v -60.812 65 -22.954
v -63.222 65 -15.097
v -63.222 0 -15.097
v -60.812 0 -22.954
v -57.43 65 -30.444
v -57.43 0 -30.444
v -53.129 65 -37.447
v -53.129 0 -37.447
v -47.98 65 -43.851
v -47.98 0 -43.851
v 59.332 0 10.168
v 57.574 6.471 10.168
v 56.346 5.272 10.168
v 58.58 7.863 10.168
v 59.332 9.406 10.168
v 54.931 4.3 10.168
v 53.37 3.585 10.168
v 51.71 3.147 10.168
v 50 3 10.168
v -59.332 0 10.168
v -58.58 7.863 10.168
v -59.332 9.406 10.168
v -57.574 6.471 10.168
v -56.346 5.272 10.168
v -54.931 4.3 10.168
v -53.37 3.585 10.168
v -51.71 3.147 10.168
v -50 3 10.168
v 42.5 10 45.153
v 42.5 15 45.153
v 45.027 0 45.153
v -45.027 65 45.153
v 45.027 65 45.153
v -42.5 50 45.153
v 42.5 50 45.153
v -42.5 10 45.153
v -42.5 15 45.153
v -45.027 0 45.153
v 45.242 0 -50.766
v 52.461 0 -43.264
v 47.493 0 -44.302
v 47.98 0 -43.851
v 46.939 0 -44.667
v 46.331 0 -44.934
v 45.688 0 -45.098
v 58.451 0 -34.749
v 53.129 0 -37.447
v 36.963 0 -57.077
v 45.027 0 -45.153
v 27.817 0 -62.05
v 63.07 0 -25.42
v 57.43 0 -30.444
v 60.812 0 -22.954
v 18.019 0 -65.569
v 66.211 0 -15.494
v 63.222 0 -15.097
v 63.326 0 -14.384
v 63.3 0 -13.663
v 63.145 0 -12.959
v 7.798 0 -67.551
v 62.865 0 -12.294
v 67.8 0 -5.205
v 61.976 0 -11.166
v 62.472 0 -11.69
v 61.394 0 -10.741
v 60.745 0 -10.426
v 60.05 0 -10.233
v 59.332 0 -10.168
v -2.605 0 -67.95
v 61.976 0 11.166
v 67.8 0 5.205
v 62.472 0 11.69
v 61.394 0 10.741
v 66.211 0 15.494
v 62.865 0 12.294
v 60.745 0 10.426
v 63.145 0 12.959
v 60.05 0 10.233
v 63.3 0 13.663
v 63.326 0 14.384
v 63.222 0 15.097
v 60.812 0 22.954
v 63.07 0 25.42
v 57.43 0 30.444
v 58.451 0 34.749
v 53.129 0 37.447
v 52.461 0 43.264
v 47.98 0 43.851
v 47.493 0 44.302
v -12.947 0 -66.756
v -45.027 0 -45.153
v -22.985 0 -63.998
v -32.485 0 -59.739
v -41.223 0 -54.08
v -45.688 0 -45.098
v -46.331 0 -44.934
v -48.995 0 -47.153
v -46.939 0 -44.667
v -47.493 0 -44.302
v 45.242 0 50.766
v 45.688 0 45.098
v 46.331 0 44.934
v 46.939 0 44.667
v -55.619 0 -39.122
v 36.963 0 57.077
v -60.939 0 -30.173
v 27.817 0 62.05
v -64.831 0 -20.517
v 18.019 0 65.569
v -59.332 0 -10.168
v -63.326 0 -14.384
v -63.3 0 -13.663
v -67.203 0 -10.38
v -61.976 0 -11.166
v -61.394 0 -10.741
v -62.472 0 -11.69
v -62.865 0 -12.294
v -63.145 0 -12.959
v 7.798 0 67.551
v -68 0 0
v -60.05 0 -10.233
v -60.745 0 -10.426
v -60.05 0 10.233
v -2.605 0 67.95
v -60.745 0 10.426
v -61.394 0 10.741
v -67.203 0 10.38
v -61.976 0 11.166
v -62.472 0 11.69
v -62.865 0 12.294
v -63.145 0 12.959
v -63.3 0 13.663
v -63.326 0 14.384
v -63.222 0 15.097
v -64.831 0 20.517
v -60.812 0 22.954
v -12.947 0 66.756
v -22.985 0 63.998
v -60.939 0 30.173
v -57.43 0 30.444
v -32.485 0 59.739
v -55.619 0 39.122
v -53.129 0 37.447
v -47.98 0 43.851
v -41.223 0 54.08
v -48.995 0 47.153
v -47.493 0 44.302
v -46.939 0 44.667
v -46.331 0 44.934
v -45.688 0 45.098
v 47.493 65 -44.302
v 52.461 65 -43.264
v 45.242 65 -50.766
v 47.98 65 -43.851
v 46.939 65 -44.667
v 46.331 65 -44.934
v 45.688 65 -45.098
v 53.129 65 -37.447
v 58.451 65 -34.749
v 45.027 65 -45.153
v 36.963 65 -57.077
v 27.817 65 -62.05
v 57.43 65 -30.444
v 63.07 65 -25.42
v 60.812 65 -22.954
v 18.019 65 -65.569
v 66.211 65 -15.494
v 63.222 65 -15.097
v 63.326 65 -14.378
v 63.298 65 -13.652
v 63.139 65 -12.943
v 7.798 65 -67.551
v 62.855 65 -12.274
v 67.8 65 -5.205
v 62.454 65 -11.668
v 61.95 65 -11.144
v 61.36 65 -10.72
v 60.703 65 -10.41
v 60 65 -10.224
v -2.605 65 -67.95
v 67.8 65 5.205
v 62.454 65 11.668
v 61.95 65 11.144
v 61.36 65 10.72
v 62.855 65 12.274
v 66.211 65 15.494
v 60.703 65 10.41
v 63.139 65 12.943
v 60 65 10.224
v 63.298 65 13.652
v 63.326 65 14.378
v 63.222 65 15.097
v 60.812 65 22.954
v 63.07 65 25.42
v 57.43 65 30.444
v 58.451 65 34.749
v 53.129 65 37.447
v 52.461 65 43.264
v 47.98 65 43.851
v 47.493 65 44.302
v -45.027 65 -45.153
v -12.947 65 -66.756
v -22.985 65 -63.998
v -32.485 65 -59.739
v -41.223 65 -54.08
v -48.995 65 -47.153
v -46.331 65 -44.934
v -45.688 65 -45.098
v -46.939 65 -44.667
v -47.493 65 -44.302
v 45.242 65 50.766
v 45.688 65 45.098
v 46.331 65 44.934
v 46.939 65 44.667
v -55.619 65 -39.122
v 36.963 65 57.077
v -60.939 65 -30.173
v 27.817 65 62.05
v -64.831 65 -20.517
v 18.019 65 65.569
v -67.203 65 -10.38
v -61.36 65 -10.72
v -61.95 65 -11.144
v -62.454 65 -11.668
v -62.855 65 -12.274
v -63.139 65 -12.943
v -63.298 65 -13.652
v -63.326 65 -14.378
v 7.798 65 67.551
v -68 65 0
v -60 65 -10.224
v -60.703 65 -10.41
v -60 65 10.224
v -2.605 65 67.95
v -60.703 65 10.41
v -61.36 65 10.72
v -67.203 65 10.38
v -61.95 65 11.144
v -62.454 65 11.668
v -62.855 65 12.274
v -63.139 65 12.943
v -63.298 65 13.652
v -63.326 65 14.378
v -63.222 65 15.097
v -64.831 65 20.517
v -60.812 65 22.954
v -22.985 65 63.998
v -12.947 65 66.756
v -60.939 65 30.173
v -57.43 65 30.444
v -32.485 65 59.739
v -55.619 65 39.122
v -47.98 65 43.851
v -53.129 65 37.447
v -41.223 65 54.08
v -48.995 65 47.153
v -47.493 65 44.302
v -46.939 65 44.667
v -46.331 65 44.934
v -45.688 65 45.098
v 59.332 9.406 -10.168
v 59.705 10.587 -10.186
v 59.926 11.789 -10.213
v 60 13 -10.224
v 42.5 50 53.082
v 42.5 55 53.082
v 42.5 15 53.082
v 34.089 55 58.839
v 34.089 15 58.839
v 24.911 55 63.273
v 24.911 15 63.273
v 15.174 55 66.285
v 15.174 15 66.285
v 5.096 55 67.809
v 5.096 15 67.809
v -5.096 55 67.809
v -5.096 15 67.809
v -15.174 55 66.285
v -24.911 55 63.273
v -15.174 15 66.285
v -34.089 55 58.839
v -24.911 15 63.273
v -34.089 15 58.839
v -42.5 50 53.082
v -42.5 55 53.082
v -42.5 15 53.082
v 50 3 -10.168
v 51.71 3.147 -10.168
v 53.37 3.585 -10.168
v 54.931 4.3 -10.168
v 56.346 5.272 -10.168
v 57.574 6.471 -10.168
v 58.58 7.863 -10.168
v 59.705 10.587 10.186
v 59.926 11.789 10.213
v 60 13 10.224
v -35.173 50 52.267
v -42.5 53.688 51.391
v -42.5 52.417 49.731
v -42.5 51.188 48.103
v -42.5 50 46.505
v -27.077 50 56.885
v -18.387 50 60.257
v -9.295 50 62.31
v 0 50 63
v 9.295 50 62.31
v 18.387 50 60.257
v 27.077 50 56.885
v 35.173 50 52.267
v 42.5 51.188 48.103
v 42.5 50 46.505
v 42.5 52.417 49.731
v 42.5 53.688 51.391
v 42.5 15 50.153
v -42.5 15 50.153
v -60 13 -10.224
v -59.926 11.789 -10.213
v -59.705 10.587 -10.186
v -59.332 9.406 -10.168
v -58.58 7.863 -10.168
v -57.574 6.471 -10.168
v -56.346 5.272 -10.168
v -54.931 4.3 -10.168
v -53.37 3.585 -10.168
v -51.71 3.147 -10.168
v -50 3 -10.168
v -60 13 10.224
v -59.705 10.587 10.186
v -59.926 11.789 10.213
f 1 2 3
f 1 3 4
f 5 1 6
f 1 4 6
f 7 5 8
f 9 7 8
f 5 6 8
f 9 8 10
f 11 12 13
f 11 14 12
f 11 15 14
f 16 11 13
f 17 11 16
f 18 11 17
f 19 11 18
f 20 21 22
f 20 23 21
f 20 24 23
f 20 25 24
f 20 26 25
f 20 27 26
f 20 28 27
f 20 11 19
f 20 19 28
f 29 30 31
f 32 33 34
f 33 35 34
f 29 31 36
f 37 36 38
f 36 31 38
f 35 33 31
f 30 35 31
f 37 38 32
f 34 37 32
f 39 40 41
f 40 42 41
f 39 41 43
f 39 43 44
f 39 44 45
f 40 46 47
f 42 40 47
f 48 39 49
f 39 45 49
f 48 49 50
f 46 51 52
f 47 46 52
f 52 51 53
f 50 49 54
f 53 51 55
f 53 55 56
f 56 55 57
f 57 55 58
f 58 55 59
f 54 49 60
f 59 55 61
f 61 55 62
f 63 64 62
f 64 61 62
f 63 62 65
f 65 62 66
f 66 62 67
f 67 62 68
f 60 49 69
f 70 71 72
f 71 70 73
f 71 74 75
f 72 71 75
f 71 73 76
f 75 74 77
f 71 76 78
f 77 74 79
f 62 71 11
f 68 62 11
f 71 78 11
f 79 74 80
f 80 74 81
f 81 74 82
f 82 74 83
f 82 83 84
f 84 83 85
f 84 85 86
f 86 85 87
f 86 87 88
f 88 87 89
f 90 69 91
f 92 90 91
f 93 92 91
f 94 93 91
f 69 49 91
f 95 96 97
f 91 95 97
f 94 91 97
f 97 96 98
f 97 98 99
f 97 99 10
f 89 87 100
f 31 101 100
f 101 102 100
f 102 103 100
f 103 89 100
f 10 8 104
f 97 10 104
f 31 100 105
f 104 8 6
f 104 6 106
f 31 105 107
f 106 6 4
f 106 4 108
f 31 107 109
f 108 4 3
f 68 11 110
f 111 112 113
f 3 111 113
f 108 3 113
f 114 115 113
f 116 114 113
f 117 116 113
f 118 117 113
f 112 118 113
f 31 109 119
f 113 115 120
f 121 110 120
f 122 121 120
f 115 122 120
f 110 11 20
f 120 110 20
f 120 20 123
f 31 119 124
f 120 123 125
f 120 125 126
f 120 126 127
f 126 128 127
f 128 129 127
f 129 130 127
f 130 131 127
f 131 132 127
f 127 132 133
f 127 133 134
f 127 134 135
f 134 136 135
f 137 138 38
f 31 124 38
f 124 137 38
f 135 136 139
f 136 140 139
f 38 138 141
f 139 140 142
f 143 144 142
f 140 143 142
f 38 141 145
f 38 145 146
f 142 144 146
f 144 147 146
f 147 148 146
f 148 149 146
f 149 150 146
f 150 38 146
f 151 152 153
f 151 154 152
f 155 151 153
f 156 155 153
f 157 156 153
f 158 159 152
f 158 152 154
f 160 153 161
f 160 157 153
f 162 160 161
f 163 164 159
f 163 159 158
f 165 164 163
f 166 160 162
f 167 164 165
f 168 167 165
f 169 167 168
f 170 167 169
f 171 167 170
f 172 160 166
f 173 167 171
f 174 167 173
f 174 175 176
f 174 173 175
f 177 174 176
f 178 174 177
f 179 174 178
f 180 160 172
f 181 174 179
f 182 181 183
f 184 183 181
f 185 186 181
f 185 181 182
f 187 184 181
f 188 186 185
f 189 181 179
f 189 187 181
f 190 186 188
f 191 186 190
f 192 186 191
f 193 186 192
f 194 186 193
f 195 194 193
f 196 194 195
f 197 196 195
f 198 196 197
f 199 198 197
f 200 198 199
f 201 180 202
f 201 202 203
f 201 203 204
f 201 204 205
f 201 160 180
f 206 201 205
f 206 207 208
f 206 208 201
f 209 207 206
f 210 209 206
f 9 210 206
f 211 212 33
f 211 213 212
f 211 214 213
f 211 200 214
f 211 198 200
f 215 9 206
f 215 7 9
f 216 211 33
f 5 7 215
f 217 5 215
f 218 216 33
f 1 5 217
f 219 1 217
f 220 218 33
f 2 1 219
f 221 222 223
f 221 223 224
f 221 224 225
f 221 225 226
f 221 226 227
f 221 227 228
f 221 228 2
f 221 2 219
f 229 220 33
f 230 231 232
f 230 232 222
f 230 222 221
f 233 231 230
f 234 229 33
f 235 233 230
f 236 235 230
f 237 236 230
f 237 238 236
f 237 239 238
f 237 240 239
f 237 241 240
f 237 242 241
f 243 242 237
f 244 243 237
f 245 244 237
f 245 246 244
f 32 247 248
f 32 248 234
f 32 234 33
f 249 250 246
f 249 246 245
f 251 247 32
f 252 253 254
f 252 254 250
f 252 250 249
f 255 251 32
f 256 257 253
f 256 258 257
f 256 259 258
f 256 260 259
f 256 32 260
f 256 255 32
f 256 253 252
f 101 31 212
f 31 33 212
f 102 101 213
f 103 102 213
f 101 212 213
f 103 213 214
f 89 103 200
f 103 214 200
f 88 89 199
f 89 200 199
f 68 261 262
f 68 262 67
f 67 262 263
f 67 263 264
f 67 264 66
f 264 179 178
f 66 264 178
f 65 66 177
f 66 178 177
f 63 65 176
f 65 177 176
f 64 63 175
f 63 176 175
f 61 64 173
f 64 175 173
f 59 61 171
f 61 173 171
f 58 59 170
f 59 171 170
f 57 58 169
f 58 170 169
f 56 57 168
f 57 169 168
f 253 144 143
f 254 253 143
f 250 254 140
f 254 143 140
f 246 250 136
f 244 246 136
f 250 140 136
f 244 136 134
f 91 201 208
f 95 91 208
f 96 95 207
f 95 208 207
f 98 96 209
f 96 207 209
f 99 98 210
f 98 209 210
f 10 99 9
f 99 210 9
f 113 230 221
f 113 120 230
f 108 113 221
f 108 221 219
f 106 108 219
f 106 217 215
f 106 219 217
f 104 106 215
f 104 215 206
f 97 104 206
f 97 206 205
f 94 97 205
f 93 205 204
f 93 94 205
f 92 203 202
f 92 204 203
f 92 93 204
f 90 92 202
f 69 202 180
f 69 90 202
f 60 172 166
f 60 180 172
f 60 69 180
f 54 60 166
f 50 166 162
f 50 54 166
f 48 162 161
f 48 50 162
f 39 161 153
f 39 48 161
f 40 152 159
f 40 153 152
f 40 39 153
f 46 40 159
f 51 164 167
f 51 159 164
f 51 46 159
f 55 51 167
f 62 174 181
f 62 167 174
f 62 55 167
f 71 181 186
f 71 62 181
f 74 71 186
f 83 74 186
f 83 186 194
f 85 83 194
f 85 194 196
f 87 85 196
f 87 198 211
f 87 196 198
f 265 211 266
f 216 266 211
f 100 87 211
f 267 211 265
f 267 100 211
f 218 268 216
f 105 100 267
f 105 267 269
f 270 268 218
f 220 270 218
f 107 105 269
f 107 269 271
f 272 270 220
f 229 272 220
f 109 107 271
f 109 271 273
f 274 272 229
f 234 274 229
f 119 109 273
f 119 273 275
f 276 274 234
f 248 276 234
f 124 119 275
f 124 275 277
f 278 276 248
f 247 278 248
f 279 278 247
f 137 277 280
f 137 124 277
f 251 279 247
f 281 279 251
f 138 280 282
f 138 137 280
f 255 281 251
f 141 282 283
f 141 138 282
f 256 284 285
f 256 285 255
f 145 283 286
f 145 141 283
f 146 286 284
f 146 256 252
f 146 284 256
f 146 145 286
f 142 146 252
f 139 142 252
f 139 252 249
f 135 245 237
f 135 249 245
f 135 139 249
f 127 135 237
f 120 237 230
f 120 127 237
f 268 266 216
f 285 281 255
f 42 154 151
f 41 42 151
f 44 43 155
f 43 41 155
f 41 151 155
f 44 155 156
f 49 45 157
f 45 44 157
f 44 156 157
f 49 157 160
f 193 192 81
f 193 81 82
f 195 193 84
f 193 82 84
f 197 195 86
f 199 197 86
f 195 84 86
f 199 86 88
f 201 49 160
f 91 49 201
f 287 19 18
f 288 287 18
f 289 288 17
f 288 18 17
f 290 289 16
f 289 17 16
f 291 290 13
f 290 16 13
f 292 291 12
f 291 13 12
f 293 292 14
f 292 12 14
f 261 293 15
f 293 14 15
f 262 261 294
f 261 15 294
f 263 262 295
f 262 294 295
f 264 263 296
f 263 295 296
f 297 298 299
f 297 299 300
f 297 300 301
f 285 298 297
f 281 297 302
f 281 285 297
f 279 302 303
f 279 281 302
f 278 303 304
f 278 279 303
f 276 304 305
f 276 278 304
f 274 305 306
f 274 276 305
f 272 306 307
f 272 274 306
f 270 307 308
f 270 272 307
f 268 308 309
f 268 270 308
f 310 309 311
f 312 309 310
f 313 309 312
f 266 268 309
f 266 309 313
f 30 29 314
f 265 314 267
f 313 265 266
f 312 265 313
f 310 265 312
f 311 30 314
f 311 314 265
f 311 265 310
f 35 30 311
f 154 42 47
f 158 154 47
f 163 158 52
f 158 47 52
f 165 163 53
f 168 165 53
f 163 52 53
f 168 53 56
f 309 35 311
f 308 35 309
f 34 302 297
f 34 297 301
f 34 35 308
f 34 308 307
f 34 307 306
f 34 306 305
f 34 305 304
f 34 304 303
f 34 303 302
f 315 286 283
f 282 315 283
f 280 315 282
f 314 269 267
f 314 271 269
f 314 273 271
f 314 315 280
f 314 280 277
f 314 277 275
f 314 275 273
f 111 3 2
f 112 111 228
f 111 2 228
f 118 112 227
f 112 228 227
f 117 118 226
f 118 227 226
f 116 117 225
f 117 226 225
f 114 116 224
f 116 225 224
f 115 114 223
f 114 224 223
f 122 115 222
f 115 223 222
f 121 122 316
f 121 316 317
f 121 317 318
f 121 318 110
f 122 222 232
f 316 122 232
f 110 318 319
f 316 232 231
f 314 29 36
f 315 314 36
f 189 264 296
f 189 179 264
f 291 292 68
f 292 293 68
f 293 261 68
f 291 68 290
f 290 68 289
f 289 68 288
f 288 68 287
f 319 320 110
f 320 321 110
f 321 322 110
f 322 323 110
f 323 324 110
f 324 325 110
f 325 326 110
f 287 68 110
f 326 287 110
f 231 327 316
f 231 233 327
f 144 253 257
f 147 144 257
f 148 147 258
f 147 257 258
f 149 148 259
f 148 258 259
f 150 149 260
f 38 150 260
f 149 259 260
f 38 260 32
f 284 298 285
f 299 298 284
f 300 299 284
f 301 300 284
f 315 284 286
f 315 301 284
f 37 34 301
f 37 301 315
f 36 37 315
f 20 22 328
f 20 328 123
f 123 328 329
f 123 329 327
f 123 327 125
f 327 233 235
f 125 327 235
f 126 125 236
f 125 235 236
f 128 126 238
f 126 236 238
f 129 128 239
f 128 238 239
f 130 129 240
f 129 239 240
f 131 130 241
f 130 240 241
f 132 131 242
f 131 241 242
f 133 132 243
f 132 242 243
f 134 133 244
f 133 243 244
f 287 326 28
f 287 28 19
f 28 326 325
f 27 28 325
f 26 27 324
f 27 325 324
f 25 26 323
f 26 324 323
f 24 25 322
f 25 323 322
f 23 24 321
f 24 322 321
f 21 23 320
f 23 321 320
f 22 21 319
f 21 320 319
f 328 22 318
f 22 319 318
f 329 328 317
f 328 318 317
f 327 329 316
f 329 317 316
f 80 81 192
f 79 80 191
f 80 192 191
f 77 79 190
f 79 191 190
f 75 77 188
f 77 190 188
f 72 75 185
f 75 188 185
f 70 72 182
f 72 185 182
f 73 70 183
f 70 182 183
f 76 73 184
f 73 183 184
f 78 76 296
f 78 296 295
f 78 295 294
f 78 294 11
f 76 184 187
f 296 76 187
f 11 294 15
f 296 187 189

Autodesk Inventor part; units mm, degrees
ref_plane "YZ Plane" through (0, 0, 0) normal (1, 0, 0) x (0, 1, 0)
ref_plane "XZ Plane" through (0, 0, 0) normal (0, 1, 0) x (-1, 0, 0)
ref_plane "XY Plane" through (0, 0, 0) normal (0, 0, 1) x (1, 0, 0)
sketch "Эскиз1" plane through (0, 0, 0) normal (0, 1, 0) x (-1, 0, 0)
  circle A0 centre (0, 0) radius 68
  dimension "d0" = 136
extrude "Выдавливание1" add sketch "Эскиз1" along normal blind 65
sketch "Эскиз2" plane through (0, 0, 0) normal (0, -1, 0) x (1, 0, 0)
  arc A0 (46.7571, -45.1528) -> (64.1997, -10.1682) centre (0, 0) ccw
  line L0 (0, 0) -> (64.1997, -10.1682) construction
  line L1 (0, 0) -> (65, 0) construction
  line L2 (0, 0) -> (46.7571, -45.1528) construction
  arc A1 (-64.1997, -10.1682) -> (-46.7571, -45.1528) centre (0, 0) ccw
  line L3 (0, 0) -> (-64.1997, -10.1682) construction
  line L4 (0, 0) -> (65, 0) construction
  line L5 (0, 0) -> (-46.7571, -45.1528) construction
  line L6 (46.7571, -45.1528) -> (-46.7571, -45.1528)
  line L7 (64.1997, -10.1682) -> (-64.1997, -10.1682)
  dimension "d3" = 65
  dimension "d4" = 9
  dimension "d5" = 35
  dimension "d6" = 65
  dimension "d7" = 171
  dimension "d8" = 35
extrude "Выдавливание2" cut sketch "Эскиз2" against normal blind 65
sketch "Эскиз3" plane through (0, 0, 0) normal (0, -1, 0) x (1, 0, 0)
  arc A0 (64.1997, 10.1682) -> (46.7571, 45.1528) centre (0, 0) ccw
  line L0 (0, 0) -> (64.1997, 10.1682) construction
  line L1 (0, 0) -> (65, 0) construction
  line L2 (0, 0) -> (46.7571, 45.1528) construction
  arc A1 (-46.7571, 45.1528) -> (-64.1997, 10.1682) centre (0, 0) ccw
  line L3 (0, 0) -> (-64.1997, 10.1682) construction
  line L4 (0, 0) -> (65, 0) construction
  line L5 (0, 0) -> (-46.7571, 45.1528) construction
  line L6 (46.7571, 45.1528) -> (-46.7571, 45.1528)
  line L7 (64.1997, 10.1682) -> (-64.1997, 10.1682)
  dimension "d11" = 65
  dimension "d12" = 9
  dimension "d13" = 35
  dimension "d14" = 65
  dimension "d15" = 171
  dimension "d16" = 35
extrude "Выдавливание3" cut sketch "Эскиз3" against normal blind 65
sketch "Эскиз4" plane through (0, 65, 0) normal (0, 1, 0) x (1, 0, 0)
  line L0 (-60, 12.5) -> (60, 12.5)
  line L1 (60, 12.5) -> (60, -12.5)
  line L2 (60, -12.5) -> (-60, -12.5)
  line L3 (-60, -12.5) -> (-60, 12.5)
  line L4 (-60, 12.5) -> (60, -12.5) construction
  line L5 (60, 12.5) -> (-60, -12.5) construction
  point P0 (0, 0)
  dimension "d19" = 120
  dimension "d20" = 25
extrude "Выдавливание4" cut sketch "Эскиз4" against normal blind 62
sketch "Эскиз5" plane through (46.7571, 0, 45.1528) normal (0, 0, -1) x (-1, 0, 0)
  line L0 (89.2571, 15) -> (4.2571, 15)
  line L1 (4.2571, 15) -> (4.2571, 50)
  line L2 (4.2571, 50) -> (89.2571, 50)
  line L3 (89.2571, 50) -> (89.2571, 15)
  line L4 (89.2571, 15) -> (4.2571, 50) construction
  line L5 (4.2571, 15) -> (89.2571, 50) construction
  point P0 (46.7571, 0)
  point P1 (46.7571, 32.5)
  dimension "d23" = 85
  dimension "d24" = 35
extrude "Выдавливание5" cut sketch "Эскиз5" against normal blind 62
chamfer "Фаска1" distance 5 angle 45 1 edges at (0, 15, 45.1528)
chamfer "Фаска2" distance 5 angle 45 1 edges at (0, 50, 68)
fillet "Сопряжение1" radius 10 1 edges at (-60, 3, 0)
fillet "Сопряжение2" radius 10 1 edges at (60, 3, 0)
fillet "Сопряжение3" radius 4 1 edges at (-64.1997, 32.5, 10.1682)
fillet "Сопряжение4" radius 4 1 edges at (-64.1997, 32.5, -10.1682)
fillet "Сопряжение5" radius 4 1 edges at (64.1997, 32.5, -10.1682)
fillet "Сопряжение6" radius 4 1 edges at (64.1997, 32.5, 10.1682)
fillet "Сопряжение7" radius 4 1 edges at (-46.7571, 32.5, -45.1528)
fillet "Сопряжение8" radius 4 1 edges at (46.7571, 32.5, -45.1528)
fillet "Сопряжение9" radius 4 1 edges at (-46.7571, 32.5, 45.1528)
fillet "Сопряжение10" radius 4 1 edges at (46.7571, 32.5, 45.1528)
